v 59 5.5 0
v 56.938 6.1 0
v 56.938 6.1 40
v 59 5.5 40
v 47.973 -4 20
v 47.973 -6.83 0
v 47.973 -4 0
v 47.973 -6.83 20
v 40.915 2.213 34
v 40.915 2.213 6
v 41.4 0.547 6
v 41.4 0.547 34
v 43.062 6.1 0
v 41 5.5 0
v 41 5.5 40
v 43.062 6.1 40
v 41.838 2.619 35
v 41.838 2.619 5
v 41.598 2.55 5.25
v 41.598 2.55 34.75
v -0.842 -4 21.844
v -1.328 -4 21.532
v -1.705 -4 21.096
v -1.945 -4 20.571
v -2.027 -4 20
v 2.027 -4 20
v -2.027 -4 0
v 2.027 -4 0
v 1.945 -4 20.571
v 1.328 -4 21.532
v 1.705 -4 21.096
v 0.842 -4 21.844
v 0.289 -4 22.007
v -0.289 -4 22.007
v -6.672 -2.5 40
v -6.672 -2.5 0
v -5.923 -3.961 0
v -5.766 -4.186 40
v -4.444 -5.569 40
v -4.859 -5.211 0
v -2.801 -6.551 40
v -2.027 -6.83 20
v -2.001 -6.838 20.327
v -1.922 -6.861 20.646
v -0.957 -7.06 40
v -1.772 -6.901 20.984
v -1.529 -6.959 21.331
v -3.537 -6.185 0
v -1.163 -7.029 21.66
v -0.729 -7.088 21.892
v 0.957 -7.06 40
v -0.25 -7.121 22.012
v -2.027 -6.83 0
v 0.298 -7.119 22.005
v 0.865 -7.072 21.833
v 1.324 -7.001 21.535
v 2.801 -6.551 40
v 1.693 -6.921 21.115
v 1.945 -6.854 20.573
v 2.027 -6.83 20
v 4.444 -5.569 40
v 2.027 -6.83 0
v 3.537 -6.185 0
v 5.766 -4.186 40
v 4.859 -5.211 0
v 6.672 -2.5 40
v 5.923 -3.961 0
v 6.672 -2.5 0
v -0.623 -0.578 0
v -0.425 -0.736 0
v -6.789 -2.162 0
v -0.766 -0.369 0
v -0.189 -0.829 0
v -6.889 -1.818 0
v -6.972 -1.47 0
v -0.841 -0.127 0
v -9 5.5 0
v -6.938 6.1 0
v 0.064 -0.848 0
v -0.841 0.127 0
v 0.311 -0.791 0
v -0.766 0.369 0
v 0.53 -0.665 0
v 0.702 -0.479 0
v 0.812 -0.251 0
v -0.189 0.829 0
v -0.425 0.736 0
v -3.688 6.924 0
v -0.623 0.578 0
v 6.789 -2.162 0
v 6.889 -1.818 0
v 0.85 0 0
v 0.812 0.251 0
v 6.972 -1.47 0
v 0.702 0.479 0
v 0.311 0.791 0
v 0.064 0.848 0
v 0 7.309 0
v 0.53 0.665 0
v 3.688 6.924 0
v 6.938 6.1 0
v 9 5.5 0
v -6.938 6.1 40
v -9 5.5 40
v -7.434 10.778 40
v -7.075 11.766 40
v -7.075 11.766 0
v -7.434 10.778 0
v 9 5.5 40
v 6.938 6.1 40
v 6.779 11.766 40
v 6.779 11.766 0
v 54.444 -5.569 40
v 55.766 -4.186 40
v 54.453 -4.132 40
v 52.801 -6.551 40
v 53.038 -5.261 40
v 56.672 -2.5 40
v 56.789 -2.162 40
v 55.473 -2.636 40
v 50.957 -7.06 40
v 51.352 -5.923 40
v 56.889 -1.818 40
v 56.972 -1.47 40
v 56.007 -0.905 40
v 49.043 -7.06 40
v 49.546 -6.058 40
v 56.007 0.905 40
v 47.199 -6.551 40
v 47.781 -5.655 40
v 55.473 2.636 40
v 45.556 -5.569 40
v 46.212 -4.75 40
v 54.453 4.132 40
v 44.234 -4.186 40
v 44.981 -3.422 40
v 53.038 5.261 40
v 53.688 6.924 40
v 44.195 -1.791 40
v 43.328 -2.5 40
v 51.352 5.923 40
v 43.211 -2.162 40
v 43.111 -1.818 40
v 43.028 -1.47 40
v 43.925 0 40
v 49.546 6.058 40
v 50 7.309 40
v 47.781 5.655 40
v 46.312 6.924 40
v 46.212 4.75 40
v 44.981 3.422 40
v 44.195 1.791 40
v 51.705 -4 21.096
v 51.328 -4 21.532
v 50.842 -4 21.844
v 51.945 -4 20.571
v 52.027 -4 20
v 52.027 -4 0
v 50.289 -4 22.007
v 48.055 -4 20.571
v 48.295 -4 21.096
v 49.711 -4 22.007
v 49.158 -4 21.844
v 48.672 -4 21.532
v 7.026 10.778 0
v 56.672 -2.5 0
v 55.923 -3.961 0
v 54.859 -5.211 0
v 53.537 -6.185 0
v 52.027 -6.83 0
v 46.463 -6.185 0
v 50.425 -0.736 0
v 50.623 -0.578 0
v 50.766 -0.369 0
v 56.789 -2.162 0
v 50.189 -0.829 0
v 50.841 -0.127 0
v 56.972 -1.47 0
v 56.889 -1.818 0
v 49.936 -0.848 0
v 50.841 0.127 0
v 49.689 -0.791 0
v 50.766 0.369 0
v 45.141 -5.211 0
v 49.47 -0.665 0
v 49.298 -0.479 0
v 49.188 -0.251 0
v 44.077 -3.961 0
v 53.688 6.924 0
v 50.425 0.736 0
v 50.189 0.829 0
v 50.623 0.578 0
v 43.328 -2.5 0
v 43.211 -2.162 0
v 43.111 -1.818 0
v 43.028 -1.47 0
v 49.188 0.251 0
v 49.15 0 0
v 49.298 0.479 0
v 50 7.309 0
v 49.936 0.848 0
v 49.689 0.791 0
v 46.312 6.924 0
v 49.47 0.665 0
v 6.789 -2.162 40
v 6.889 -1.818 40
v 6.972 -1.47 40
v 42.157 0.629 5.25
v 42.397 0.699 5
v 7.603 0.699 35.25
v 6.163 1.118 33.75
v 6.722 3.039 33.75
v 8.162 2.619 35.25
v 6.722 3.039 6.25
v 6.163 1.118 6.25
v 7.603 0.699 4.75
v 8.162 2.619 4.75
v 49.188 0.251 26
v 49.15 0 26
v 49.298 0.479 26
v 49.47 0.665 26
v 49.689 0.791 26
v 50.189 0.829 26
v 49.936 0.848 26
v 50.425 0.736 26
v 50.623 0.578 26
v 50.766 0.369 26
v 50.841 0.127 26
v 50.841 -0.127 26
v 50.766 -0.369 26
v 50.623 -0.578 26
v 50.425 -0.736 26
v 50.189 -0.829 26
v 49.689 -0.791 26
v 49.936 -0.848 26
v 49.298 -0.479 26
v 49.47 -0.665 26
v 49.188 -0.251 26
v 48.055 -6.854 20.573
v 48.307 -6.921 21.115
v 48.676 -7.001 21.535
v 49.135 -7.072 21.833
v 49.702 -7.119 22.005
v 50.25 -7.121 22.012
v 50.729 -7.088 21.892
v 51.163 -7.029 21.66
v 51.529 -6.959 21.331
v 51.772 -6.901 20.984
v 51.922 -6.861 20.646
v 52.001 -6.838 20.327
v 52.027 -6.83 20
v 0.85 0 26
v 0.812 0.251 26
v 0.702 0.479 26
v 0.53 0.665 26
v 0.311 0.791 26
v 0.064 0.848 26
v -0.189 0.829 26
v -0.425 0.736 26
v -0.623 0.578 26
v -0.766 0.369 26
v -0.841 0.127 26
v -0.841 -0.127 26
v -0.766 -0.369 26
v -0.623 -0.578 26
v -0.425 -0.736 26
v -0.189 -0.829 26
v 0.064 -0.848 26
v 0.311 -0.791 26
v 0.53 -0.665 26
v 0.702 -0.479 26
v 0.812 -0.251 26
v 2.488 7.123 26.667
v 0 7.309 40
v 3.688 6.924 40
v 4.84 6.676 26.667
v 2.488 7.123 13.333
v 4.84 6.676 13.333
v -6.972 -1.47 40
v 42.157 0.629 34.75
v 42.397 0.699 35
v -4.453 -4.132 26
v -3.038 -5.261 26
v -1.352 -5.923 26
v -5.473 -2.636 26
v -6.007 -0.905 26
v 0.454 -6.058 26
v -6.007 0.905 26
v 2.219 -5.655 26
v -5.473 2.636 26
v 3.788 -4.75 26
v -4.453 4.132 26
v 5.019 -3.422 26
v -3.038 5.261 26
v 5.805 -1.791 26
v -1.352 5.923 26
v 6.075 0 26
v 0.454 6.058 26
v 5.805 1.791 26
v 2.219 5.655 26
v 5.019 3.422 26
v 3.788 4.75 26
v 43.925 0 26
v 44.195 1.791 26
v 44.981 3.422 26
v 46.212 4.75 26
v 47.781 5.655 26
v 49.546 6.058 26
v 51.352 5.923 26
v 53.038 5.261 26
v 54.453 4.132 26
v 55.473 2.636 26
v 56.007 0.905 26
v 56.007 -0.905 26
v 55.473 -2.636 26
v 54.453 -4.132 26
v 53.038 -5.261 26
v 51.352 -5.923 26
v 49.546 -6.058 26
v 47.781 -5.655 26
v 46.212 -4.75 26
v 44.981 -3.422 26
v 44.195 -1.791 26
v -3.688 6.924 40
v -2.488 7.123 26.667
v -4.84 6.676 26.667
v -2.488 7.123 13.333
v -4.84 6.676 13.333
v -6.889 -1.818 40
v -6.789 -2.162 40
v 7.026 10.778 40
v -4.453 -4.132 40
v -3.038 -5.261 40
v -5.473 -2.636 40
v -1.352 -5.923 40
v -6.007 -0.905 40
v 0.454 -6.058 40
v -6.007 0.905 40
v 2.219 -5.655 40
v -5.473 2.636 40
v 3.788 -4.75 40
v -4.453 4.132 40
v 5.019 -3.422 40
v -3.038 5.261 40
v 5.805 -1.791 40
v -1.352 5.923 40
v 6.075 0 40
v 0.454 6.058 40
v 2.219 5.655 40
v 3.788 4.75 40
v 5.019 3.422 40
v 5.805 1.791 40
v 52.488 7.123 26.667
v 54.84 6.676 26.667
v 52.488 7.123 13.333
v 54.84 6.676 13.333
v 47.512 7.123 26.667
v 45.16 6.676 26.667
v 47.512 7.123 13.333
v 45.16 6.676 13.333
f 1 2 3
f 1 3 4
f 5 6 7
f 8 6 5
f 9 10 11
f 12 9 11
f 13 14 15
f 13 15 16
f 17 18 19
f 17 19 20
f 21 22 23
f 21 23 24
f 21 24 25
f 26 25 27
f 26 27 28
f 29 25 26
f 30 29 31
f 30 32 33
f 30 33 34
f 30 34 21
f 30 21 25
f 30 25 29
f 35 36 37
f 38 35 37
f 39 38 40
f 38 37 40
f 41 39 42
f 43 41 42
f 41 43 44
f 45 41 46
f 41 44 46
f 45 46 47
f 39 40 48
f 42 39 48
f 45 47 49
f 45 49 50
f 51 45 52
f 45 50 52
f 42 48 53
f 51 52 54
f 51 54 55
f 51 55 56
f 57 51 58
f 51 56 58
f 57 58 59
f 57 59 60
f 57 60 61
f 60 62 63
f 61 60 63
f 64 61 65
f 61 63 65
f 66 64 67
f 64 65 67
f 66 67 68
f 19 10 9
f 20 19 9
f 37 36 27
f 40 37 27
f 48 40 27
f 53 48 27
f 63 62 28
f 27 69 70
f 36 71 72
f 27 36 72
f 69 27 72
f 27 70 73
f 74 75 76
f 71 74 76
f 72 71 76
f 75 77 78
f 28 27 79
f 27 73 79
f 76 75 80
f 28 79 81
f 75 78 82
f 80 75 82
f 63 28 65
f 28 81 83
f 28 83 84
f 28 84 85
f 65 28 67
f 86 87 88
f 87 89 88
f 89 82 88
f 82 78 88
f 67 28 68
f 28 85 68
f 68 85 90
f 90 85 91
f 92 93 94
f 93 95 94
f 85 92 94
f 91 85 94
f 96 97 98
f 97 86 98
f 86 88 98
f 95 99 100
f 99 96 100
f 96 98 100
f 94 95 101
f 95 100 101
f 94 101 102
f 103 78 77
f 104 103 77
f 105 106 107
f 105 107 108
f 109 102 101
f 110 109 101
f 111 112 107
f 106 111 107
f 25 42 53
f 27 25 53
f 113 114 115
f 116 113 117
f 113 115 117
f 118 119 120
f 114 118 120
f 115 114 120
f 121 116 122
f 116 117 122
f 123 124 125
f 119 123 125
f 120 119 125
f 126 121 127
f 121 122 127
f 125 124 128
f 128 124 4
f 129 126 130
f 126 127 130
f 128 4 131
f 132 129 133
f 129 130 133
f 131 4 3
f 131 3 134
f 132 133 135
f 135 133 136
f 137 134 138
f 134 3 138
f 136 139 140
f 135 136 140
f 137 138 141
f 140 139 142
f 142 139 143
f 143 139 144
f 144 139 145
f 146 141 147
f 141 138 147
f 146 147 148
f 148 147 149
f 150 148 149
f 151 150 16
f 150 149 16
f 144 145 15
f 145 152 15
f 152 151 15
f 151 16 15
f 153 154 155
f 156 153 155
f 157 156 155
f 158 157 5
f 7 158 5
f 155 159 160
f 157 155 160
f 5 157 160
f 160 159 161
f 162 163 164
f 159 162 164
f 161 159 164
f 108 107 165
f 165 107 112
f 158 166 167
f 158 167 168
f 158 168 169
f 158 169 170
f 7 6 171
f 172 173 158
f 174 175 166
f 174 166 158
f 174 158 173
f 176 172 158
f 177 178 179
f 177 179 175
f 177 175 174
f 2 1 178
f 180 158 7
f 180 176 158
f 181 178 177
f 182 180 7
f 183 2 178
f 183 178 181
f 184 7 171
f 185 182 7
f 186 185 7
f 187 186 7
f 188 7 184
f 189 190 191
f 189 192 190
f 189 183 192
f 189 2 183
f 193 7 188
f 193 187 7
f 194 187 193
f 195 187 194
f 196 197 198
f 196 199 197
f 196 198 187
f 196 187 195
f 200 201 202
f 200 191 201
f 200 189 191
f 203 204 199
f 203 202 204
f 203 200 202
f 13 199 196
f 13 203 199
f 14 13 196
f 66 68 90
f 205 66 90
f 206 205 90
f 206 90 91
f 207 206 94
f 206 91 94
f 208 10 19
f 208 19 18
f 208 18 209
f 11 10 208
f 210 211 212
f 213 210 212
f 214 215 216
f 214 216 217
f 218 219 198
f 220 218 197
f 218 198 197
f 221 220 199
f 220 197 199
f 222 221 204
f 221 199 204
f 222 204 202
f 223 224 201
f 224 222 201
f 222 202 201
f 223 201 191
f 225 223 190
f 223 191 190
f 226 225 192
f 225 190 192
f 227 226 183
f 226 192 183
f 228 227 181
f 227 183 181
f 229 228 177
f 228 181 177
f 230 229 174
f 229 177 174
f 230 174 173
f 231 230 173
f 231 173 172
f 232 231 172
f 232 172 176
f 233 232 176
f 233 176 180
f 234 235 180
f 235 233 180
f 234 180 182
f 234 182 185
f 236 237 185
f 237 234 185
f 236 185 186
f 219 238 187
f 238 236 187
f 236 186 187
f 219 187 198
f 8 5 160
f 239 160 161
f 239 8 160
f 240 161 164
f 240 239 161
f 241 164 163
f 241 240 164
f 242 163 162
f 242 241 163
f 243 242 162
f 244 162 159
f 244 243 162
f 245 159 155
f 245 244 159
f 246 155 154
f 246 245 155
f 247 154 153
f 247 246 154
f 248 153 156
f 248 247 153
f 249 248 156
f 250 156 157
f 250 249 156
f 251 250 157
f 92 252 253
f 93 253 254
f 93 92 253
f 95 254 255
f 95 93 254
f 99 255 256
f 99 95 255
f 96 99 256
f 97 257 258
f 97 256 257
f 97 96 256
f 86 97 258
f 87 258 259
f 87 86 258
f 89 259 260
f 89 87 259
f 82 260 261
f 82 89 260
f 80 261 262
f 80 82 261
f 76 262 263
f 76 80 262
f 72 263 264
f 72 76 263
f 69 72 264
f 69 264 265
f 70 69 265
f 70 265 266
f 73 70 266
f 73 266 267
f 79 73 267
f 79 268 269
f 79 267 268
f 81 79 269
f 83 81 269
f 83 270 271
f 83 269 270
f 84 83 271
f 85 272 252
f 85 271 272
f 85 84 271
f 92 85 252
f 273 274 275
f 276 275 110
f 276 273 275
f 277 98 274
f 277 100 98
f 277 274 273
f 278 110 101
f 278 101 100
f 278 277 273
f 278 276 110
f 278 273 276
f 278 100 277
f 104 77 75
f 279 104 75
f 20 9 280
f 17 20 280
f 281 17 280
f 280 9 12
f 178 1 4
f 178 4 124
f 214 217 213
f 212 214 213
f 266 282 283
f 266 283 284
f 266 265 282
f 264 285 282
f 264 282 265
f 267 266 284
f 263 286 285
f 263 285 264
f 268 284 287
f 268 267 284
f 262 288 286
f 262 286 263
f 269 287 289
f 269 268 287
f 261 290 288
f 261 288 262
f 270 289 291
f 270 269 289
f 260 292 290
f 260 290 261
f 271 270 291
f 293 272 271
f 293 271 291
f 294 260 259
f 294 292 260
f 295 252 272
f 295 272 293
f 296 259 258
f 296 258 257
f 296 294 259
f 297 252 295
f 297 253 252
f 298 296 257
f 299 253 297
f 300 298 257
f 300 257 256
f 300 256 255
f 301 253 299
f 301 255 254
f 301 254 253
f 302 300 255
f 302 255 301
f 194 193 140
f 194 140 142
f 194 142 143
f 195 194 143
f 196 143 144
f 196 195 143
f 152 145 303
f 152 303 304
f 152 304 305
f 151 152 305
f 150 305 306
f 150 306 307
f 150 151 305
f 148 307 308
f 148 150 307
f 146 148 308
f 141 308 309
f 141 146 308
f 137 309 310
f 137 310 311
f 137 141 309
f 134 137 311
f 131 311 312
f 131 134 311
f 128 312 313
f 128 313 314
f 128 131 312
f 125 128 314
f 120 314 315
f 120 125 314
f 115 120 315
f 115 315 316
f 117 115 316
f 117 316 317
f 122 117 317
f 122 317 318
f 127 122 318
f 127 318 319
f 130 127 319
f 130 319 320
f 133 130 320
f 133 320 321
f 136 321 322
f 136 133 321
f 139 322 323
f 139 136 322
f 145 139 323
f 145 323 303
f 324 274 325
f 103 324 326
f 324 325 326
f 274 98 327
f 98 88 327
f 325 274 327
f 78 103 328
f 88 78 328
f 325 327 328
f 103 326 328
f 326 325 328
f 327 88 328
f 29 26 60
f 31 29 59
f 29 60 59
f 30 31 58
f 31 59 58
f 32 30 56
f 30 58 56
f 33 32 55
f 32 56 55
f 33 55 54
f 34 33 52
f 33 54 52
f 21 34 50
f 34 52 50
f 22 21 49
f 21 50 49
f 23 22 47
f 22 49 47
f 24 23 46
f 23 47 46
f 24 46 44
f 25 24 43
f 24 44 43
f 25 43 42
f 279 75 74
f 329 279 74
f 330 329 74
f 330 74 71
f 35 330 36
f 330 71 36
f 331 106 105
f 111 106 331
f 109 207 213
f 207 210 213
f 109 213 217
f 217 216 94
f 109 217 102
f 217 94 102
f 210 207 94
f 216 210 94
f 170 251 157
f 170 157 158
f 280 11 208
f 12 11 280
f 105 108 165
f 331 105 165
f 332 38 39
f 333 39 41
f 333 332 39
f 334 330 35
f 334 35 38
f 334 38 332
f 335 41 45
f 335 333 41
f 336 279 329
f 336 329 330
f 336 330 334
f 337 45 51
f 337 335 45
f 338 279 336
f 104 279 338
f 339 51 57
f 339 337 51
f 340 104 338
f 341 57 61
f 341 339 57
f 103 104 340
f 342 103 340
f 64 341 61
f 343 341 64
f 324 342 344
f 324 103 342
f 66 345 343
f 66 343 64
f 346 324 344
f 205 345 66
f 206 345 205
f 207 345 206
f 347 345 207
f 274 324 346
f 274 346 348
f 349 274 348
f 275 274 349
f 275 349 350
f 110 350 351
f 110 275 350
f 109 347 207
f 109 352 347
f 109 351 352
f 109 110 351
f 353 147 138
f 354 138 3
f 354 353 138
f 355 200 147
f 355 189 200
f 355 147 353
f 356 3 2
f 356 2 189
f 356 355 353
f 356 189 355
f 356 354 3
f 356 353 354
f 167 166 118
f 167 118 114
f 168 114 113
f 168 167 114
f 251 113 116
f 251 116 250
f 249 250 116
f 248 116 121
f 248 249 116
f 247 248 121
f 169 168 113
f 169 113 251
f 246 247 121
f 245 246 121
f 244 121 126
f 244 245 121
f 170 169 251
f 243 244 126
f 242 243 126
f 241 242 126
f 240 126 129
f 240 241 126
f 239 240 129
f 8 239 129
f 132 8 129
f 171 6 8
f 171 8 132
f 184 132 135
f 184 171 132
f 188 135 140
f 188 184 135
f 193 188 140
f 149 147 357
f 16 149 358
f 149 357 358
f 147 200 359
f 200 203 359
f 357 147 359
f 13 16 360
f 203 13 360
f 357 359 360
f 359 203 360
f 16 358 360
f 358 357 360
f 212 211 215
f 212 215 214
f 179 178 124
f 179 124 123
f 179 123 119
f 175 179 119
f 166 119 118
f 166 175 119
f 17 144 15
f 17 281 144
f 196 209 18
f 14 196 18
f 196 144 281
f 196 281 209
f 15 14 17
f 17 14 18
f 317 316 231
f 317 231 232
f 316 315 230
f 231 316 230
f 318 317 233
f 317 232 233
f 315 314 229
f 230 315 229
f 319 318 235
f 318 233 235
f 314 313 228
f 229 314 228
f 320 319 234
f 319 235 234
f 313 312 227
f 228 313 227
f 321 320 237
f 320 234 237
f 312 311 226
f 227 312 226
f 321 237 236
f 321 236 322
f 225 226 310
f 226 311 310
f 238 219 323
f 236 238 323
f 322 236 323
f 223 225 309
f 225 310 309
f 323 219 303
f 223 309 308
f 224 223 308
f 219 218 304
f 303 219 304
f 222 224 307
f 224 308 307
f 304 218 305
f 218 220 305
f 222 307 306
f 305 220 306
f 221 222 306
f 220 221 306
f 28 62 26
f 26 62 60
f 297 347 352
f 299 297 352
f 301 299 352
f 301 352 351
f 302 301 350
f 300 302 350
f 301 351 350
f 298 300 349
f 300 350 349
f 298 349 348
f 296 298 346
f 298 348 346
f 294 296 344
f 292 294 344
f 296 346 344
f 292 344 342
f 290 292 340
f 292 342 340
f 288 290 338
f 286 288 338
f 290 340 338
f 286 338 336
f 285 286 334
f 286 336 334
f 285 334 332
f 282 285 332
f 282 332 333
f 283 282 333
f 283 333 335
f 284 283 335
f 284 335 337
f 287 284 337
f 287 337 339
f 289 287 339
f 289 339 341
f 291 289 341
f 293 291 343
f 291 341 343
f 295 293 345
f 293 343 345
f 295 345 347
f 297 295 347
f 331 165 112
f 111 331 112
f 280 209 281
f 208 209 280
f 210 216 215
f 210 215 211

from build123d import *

# Parameters (mm, degrees)
F0_R        = 0.85
F1_DEPTH    = 40
F3_R        = 6.075
F4_DEPTH    = 14
F6_DEPTH    = 40
F9_DEPTH    = 6
F11_W       = 2
F11_H       = 30
F13_DEPTH   = 1
F12_W       = 2
F12_H       = 30.5
F14_DEPTH   = 1.5
F15_SIZE    = 0.99999
F16_SIZE2   = 0.1322452355
F16_SIZE    = 0.75
F16_2_SIZE2 = 0.1322452355
F16_2_SIZE  = 0.75
F17_SIZE    = 1.49999


# Not quite as in the source:
# - a fillet or chamfer is up to 0.001 mm smaller than in the source, because OpenCascade refuses the exact size


with BuildPart() as f1:
    # F0 (on Top) → F1 (new body)
    with BuildSketch(Plane.XY):
        with BuildLine():
            Line((-6.9716463271, -1.4702967352), (-6.6720030725, -2.5))
            ThreePointArc((-6.6720030725, -2.5), (0, -7.125), (6.6720030725, -2.5))
            Line((6.6720030725, -2.5), (6.9716463271, -1.4702967352))
            ThreePointArc((6.9716463271, -1.4702967352), (7.0865578767, -0.739136293), (7.125, 0))
            ThreePointArc((7.125, 0), (-0.739136293, 7.0865578767), (-6.9716463271, -1.4702967352))
        make_face()
        Circle(F0_R, mode=Mode.SUBTRACT)
        with BuildLine():
            ThreePointArc((-6.9716463271, -1.4702967352), (-6.8412253609, -1.9907939525), (-6.6720030725, -2.5))
            Line((-6.6720030725, -2.5), (-6.9716463271, -1.4702967352))
        make_face()
        with BuildLine():
            Line((6.9716463271, -1.4702967352), (6.6720030725, -2.5))
            ThreePointArc((6.6720030725, -2.5), (6.8412253609, -1.9907939525), (6.9716463271, -1.4702967352))
        make_face()
        with BuildLine():
            Line((-9, 5.5), (-6.9716463271, -1.4702967352))
            ThreePointArc((-6.9716463271, -1.4702967352), (-0.739136293, 7.0865578767), (7.125, 0))
            ThreePointArc((7.125, 0), (7.0865578767, -0.739136293), (6.9716463271, -1.4702967352))
            Line((6.9716463271, -1.4702967352), (9, 5.5))
            Line((9, 5.5), (6.9381416086, 6.1))
            add(Edge.make_bspline(
                [(0, 7.3087555656), (2.5162656326, 7.2960948201), (5.0063073264, 6.69804741), (6.9381416086, 6.1)],
                knots=[0.0229980904, 0.0229980904, 0.0229980904, 0.0229980904, 7.0669493094, 7.0669493094, 7.0669493094, 7.0669493094], degree=3))
            add(Edge.make_bspline(
                [(0, 7.3087555656), (-2.5162656326, 7.2960948201), (-5.0063073264, 6.69804741), (-6.9381416086, 6.1)],
                knots=[0.0229980904, 0.0229980904, 0.0229980904, 0.0229980904, 7.0669493094, 7.0669493094, 7.0669493094, 7.0669493094], degree=3))
            Line((-6.9381416086, 6.1), (-9, 5.5))
        make_face()
    extrude(amount=F1_DEPTH)

    # F3 (on face) → F4 (cut)
    with BuildSketch(Plane.XY.offset(40)):
        Circle(F3_R)
    extrude(amount=-F4_DEPTH, mode=Mode.SUBTRACT)

    # F8 (on offset) → F9 (cut)
    with BuildSketch(Plane.XZ.offset(10)):
        with BuildLine():
            Line((-2.0273134933, 20), (-2.0273134933, 0))
            Line((-2.0273134933, 0), (2.0273134933, 0))
            Line((2.0273134933, 0), (2.0273134933, 20))
            ThreePointArc((2.0273134933, 20), (0, 22.0273134933), (-2.0273134933, 20))
        make_face()
    extrude(amount=-F9_DEPTH, mode=Mode.SUBTRACT)


with BuildPart() as f6:
    # F5 (on Top) → F6 (new body)
    with BuildSketch(Plane.XY):
        Polygon((6.7794237824, 11.7658044089), (-7.0748599067, 11.7658044089), (-7.4343305431, 10.7781669524), (7.0256694569, 10.7781669524), align=None)
    extrude(amount=F6_DEPTH)


with BuildPart() as f10_1:
    # F10: instance of F1
    add(f1.part.mirror(Plane.YZ.offset(25)))

    # F11 (on face) → F13 (join)
    with BuildSketch(Plane(origin=(39.2746869048, 11.4289188052, 0), x_dir=(0.2794096775, -0.9601719805, 0), z_dir=(-0.9601719805, -0.2794096775, 0))):
        with Locations((10.1748508868, 20)):
            Rectangle(F11_W, F11_H)
    extrude(amount=F13_DEPTH)

    # F15 (size 1 in the source; OpenCascade refuses exactly that, so slightly less here)
    f15_edges = [f10_1.edges().sort_by_distance(p)[0] for p in [
        (41.157467, 1.379902, 5),
        (41.157467, 1.379902, 35),
    ]]
    chamfer(f15_edges, length=F15_SIZE)

    # F16
    f16_edges = [f10_1.edges().sort_by_distance(p)[0] for p in [
        (41.436876, 0.41973, 20),
    ]]
    f16_side = f10_1.faces().sort_by_distance((41.922481, 0.561041, 20))[0]
    chamfer(f16_edges, length=F16_SIZE, length2=F16_SIZE2, reference=f16_side)

    # F16#2
    f16_2_edges = [f10_1.edges().sort_by_distance(p)[0] for p in [
        (40.878057, 2.340074, 20),
    ]]
    f16_2_side = f10_1.faces().sort_by_distance((41.363661, 2.481385, 20))[0]
    chamfer(f16_2_edges, length=F16_2_SIZE, length2=F16_2_SIZE2, reference=f16_2_side)


with BuildPart() as f1_1:
    add(f1.part)

    # F12 (on face) → F14 (cut)
    with BuildSketch(Plane(origin=(6.8218246998, -1.9851483676, 0), x_dir=(0.2794096775, 0.9601719805, 0), z_dir=(0.9601719805, -0.2794096775, 0))):
        with Locations((3.7956329906, 20)):
            Rectangle(F12_W, F12_H)
    extrude(amount=-F14_DEPTH, mode=Mode.SUBTRACT)

    # F17 (size 1.5 in the source; OpenCascade refuses exactly that, so slightly less here)
    f17_edges = [f1_1.edges().sort_by_distance(p)[0] for p in [
        (6.442103, 2.078427, 35.25),
        (6.442103, 2.078427, 4.75),
    ]]
    chamfer(f17_edges, length=F17_SIZE)


solid = Compound([f6.part, f10_1.part, f1_1.part])
